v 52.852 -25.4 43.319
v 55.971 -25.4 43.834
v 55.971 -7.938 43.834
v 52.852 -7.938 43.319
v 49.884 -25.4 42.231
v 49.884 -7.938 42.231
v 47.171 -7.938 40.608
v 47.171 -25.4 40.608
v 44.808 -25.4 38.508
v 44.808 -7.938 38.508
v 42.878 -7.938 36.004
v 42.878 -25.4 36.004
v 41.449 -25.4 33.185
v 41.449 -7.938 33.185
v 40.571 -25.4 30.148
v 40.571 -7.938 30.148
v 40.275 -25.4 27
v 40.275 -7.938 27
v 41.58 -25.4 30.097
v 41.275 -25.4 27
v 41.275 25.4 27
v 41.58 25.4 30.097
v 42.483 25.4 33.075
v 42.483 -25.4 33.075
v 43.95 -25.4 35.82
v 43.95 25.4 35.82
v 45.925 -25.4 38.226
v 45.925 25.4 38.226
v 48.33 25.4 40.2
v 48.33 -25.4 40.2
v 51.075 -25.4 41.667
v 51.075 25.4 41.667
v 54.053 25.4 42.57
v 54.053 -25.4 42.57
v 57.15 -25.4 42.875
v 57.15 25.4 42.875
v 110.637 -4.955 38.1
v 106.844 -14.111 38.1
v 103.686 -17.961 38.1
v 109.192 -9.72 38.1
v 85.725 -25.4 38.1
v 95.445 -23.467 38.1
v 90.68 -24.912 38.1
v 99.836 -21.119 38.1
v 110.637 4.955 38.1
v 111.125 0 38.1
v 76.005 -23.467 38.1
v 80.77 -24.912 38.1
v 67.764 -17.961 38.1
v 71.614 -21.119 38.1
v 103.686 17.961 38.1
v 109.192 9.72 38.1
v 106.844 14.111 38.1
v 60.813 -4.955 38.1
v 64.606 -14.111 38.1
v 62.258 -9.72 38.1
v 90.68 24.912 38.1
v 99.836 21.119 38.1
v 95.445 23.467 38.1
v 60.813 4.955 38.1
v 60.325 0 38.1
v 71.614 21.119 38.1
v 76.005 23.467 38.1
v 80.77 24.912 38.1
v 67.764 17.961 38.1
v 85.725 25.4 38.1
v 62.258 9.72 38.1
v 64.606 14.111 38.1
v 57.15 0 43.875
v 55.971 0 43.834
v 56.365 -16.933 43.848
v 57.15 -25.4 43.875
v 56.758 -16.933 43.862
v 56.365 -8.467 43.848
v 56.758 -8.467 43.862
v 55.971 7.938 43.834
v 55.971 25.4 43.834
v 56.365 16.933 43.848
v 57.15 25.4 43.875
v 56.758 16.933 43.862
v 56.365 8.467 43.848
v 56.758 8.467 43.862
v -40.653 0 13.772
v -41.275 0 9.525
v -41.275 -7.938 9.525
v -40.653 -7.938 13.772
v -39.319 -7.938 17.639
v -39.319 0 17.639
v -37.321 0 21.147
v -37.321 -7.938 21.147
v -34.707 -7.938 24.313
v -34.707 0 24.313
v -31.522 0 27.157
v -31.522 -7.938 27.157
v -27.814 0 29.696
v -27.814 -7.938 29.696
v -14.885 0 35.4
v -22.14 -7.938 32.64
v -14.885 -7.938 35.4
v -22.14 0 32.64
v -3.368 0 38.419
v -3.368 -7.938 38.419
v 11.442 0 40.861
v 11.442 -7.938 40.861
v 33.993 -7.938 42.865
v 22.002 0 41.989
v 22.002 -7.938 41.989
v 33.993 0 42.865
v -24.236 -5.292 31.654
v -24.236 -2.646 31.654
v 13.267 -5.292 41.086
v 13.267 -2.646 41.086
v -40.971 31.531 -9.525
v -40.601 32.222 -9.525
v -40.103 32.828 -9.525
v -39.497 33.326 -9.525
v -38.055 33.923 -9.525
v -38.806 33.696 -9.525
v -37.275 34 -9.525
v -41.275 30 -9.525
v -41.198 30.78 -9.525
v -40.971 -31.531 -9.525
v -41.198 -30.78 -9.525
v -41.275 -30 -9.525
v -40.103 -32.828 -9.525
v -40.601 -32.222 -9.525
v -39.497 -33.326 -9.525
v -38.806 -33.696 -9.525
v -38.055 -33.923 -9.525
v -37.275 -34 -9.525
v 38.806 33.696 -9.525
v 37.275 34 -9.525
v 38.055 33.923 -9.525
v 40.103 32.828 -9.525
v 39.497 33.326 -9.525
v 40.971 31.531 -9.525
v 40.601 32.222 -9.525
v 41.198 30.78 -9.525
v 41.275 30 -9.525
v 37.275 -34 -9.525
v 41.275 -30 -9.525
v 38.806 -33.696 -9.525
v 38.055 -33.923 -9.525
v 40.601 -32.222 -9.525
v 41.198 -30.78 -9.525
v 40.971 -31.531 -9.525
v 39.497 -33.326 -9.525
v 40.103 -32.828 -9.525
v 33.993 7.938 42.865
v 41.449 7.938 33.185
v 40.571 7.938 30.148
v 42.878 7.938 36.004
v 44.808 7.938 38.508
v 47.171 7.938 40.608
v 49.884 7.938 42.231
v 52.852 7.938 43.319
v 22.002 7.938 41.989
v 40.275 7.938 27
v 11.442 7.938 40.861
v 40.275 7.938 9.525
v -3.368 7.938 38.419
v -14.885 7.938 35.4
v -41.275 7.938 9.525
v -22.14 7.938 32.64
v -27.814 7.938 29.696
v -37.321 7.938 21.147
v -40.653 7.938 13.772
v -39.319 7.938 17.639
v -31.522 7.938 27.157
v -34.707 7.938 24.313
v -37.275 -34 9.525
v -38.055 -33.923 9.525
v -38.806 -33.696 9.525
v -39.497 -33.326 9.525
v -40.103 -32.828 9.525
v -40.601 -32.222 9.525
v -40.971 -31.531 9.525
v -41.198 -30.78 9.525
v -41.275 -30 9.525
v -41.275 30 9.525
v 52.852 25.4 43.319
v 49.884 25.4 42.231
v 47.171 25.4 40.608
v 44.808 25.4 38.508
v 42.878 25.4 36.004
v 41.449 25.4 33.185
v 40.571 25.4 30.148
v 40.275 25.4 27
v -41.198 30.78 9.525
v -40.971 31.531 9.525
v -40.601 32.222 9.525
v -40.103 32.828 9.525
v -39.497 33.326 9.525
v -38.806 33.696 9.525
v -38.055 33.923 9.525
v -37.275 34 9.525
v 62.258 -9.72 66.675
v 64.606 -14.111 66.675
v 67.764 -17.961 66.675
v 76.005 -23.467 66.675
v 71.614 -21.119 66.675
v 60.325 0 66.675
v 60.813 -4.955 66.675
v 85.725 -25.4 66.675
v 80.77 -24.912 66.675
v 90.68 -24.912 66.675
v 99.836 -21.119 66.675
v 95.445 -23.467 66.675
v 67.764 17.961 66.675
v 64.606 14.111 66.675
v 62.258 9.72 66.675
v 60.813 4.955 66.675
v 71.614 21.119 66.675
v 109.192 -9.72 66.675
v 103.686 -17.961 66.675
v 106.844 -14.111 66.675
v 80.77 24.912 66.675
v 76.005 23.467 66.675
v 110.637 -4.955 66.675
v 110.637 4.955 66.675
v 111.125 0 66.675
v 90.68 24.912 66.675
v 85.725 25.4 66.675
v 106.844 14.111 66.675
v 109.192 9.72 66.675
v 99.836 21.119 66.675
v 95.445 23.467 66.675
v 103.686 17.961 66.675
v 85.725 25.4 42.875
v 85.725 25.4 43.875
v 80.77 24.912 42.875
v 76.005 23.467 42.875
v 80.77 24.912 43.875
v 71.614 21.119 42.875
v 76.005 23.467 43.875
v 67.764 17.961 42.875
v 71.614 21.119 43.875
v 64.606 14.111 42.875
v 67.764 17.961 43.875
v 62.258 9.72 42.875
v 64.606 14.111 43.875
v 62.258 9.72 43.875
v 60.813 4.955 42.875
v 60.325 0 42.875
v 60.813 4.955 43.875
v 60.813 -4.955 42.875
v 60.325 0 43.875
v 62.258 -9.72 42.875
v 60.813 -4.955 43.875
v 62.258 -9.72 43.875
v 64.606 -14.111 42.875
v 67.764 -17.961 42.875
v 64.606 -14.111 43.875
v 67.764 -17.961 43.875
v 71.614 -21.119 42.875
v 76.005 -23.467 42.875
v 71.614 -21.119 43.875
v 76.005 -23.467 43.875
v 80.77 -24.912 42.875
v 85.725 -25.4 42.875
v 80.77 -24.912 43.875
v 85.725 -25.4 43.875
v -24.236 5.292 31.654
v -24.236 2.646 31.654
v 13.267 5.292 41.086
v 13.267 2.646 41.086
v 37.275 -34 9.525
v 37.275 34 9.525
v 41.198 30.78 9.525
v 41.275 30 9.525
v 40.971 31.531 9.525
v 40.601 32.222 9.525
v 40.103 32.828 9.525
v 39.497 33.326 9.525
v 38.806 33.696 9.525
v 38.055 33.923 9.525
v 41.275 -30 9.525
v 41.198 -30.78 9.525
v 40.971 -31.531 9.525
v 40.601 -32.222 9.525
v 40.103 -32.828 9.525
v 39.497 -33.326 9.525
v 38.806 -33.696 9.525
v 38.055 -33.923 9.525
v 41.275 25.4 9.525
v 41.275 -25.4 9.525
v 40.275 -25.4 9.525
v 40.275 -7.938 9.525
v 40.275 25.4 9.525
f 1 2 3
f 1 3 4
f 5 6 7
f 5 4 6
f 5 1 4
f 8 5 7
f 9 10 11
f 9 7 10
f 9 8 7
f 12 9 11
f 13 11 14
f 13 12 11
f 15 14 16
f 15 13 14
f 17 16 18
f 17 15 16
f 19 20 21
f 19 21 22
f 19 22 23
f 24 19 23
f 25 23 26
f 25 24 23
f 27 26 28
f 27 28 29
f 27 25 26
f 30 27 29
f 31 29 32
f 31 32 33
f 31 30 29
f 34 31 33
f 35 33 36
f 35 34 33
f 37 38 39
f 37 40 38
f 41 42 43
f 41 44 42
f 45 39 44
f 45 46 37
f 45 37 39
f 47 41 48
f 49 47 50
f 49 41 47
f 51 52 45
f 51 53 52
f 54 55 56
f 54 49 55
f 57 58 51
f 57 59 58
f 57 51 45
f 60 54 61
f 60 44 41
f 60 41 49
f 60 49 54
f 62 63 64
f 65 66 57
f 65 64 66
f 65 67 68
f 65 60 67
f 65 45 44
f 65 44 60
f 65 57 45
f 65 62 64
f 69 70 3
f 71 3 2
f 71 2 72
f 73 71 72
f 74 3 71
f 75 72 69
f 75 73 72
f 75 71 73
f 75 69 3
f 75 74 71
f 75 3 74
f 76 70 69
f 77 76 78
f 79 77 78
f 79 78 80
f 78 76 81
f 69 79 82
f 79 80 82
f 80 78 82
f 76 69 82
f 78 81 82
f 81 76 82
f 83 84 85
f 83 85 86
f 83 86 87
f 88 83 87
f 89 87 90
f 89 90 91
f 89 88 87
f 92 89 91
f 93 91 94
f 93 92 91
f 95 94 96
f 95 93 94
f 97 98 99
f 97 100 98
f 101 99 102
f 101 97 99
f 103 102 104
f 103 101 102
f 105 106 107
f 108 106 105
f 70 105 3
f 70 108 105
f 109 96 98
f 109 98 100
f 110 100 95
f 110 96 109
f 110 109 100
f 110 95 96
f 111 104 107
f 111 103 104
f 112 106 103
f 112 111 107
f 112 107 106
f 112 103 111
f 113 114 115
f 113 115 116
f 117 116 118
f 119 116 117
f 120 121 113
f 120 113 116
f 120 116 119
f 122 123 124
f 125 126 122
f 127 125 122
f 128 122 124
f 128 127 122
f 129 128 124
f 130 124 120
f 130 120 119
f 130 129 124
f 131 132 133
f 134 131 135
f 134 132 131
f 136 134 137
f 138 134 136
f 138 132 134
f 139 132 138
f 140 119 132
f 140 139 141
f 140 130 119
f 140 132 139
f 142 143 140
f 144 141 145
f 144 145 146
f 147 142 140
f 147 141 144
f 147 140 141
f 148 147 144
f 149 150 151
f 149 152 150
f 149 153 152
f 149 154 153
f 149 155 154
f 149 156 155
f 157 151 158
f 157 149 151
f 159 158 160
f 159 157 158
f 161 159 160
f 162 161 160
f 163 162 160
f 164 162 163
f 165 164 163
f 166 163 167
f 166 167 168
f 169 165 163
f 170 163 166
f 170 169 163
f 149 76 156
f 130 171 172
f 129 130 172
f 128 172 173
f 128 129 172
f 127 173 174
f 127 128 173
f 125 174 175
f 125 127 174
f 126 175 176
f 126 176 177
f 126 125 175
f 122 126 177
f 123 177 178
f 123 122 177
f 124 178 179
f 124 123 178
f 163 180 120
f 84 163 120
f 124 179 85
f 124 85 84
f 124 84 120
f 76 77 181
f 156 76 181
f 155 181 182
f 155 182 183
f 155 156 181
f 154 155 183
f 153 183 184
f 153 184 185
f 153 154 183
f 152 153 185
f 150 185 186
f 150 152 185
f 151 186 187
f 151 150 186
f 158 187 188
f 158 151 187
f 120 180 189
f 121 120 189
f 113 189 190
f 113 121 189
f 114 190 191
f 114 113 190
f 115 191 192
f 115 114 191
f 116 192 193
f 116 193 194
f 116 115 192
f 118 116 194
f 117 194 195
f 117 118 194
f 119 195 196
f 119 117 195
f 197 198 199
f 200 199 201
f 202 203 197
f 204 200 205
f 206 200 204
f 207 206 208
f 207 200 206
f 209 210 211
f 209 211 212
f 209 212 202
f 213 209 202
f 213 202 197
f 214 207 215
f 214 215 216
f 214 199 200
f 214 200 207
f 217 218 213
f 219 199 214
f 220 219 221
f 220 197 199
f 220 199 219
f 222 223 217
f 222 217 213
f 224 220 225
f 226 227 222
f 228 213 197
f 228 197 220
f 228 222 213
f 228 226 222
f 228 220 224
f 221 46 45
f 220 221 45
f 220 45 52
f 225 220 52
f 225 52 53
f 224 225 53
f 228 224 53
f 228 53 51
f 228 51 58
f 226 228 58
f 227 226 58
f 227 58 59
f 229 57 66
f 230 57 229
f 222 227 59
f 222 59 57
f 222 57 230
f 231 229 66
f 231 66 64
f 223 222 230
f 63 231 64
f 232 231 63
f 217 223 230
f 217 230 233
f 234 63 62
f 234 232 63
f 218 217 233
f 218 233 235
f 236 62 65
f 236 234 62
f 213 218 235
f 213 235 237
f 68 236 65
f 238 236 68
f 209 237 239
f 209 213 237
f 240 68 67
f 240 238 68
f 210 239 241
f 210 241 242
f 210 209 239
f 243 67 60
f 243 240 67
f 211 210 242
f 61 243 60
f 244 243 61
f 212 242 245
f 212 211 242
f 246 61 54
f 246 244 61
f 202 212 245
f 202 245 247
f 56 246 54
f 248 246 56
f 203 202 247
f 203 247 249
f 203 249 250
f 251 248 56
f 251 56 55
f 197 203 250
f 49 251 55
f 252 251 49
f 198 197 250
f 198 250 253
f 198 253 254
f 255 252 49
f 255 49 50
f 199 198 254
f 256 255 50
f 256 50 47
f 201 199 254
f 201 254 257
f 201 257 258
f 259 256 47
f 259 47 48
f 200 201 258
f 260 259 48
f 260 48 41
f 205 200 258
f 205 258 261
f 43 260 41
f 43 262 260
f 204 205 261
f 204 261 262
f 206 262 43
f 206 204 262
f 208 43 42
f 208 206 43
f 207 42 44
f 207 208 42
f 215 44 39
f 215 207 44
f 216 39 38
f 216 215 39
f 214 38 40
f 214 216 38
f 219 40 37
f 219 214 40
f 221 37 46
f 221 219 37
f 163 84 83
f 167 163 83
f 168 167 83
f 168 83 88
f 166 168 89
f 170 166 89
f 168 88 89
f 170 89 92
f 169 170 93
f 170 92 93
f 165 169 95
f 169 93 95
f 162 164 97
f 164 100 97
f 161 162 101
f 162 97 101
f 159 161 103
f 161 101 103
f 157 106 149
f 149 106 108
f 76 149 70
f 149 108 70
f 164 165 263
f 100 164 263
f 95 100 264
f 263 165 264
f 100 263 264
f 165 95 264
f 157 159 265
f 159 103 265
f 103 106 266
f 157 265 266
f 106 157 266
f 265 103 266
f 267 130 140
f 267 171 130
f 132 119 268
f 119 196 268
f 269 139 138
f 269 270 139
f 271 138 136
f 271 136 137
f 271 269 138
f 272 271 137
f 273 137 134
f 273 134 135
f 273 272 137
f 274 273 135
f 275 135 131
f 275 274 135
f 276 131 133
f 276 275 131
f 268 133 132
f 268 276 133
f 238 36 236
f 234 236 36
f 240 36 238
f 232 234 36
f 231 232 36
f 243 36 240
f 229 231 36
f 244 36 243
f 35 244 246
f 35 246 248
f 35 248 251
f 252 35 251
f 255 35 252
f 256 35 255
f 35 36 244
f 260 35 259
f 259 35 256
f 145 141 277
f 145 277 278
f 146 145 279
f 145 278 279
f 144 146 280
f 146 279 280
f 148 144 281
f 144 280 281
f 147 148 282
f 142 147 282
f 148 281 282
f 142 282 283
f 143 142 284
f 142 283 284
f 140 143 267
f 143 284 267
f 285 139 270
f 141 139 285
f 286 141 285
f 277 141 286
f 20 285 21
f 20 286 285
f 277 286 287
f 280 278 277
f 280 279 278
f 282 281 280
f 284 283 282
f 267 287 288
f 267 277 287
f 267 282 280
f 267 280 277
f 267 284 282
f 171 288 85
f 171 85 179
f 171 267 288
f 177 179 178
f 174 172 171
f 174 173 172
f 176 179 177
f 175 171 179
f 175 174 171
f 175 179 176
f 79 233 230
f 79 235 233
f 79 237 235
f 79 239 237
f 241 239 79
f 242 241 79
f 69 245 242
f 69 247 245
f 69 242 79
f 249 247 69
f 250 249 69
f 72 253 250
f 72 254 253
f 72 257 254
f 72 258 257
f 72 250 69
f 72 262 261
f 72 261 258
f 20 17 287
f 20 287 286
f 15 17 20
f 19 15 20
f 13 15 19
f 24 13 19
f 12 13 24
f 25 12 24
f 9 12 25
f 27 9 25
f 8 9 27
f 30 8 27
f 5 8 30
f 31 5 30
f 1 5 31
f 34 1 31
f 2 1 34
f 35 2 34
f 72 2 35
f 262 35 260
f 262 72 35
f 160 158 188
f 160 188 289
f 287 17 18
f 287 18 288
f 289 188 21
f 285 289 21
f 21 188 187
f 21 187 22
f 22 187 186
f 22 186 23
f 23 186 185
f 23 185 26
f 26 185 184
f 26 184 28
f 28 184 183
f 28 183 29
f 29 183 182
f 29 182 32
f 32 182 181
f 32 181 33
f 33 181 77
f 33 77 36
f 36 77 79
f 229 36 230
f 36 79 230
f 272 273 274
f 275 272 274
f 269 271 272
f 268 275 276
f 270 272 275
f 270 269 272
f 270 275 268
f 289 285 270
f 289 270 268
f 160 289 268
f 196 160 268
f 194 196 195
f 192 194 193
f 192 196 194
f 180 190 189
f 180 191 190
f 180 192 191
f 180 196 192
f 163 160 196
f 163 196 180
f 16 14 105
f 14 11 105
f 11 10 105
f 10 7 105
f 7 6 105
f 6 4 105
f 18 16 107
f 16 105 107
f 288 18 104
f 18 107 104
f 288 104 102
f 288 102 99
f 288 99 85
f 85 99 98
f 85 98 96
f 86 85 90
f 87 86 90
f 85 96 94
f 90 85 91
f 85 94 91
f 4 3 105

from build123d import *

# Parameters (mm, degrees)
F1_DEPTH = 34
F0_W     = 25.4
F0_H     = 1
F2_DEPTH = 25.4
F3_DEPTH = 7.9375
F5_R     = 4
F6_DEPTH = 16


with BuildPart() as f1:
    # F0 (on Front) → F1 (new body, symmetric)
    with BuildSketch(Plane.XZ):
        Polygon((40.275, 9.525), (-41.275, 9.525), (-41.275, -9.525), (41.275, -9.525), (41.275, 9.525), align=None)
    extrude(amount=F1_DEPTH, both=True)

    # F0 (on Front) → F2 (join, symmetric)
    with BuildSketch(Plane.XZ):
        with BuildLine():
            Line((40.275, 27.0002), (40.275, 9.525))
            Line((40.275, 9.525), (41.275, 9.525))
            Line((41.275, 9.525), (41.275, 27.0002))
            ThreePointArc((41.275, 27.0002), (45.9246798487, 38.2255201513), (57.15, 42.8752))
            Line((57.15, 42.8752), (60.325, 42.8752))
            Line((60.325, 42.8752), (60.325, 43.8752))
            Line((60.325, 43.8752), (57.15, 43.8752))
            add(Edge.make_bspline(
                [(55.9712612806, 43.8339815131), (56.3656474087, 43.8478093746), (56.7585819078, 43.8615403645), (57.15, 43.8752)],
                knots=[103.2345242702, 103.2345242702, 103.2345242702, 103.2345242702, 104.2469033835, 104.2469033835, 104.2469033835, 104.2469033835], degree=3))
            ThreePointArc((55.9712612806, 43.8339815131), (44.8078599731, 38.5083364502), (40.275, 27.0002))
        make_face()
        with Locations((73.025, 43.3752)):
            Rectangle(F0_W, F0_H)
    extrude(amount=F2_DEPTH, both=True)

    # F0 (on Front) → F3 (join, symmetric)
    with BuildSketch(Plane.XZ):
        with BuildLine():
            add(Edge.make_bspline(
                [(-41.275, 9.525), (-39.5560968864, 40.0065637522), (15.7548405948, 42.4239240696), (55.9712612806, 43.8339815131)],
                knots=[0, 0, 0, 0, 103.2345242702, 103.2345242702, 103.2345242702, 103.2345242702], degree=3))
            Line((-41.275, 9.525), (40.275, 9.525))
            Line((40.275, 9.525), (40.275, 27.0002))
            ThreePointArc((40.275, 27.0002), (44.8078599731, 38.5083364502), (55.9712612806, 43.8339815131))
        make_face()
    extrude(amount=F3_DEPTH, both=True)

    # F0 (on Front) → F4 (revolve)
    with BuildSketch(Plane.XZ):
        Polygon((85.725, 66.675), (85.725, 43.8752), (85.725, 42.8752), (85.725, 38.1), (111.125, 38.1), (111.125, 66.675), align=None)
    revolve(axis=Axis((85.725, 0, 52.3875), (0, 0, 1)))

    # F5
    f5_edges = [f1.edges().sort_by_distance(p)[0] for p in [
        (41.275, -34, 0),
        (-41.275, -34, 0),
        (41.275, 34, 0),
        (-41.275, 34, 0),
    ]]
    fillet(f5_edges, radius=F5_R)

    # F6 (add): a face of the model
    f6_faces = [f1.faces().sort_by_distance(p)[0] for p in [
        (85.725, 0, 66.675),
    ]]
    extrude(f6_faces, amount=-F6_DEPTH)


solid = f1.part
